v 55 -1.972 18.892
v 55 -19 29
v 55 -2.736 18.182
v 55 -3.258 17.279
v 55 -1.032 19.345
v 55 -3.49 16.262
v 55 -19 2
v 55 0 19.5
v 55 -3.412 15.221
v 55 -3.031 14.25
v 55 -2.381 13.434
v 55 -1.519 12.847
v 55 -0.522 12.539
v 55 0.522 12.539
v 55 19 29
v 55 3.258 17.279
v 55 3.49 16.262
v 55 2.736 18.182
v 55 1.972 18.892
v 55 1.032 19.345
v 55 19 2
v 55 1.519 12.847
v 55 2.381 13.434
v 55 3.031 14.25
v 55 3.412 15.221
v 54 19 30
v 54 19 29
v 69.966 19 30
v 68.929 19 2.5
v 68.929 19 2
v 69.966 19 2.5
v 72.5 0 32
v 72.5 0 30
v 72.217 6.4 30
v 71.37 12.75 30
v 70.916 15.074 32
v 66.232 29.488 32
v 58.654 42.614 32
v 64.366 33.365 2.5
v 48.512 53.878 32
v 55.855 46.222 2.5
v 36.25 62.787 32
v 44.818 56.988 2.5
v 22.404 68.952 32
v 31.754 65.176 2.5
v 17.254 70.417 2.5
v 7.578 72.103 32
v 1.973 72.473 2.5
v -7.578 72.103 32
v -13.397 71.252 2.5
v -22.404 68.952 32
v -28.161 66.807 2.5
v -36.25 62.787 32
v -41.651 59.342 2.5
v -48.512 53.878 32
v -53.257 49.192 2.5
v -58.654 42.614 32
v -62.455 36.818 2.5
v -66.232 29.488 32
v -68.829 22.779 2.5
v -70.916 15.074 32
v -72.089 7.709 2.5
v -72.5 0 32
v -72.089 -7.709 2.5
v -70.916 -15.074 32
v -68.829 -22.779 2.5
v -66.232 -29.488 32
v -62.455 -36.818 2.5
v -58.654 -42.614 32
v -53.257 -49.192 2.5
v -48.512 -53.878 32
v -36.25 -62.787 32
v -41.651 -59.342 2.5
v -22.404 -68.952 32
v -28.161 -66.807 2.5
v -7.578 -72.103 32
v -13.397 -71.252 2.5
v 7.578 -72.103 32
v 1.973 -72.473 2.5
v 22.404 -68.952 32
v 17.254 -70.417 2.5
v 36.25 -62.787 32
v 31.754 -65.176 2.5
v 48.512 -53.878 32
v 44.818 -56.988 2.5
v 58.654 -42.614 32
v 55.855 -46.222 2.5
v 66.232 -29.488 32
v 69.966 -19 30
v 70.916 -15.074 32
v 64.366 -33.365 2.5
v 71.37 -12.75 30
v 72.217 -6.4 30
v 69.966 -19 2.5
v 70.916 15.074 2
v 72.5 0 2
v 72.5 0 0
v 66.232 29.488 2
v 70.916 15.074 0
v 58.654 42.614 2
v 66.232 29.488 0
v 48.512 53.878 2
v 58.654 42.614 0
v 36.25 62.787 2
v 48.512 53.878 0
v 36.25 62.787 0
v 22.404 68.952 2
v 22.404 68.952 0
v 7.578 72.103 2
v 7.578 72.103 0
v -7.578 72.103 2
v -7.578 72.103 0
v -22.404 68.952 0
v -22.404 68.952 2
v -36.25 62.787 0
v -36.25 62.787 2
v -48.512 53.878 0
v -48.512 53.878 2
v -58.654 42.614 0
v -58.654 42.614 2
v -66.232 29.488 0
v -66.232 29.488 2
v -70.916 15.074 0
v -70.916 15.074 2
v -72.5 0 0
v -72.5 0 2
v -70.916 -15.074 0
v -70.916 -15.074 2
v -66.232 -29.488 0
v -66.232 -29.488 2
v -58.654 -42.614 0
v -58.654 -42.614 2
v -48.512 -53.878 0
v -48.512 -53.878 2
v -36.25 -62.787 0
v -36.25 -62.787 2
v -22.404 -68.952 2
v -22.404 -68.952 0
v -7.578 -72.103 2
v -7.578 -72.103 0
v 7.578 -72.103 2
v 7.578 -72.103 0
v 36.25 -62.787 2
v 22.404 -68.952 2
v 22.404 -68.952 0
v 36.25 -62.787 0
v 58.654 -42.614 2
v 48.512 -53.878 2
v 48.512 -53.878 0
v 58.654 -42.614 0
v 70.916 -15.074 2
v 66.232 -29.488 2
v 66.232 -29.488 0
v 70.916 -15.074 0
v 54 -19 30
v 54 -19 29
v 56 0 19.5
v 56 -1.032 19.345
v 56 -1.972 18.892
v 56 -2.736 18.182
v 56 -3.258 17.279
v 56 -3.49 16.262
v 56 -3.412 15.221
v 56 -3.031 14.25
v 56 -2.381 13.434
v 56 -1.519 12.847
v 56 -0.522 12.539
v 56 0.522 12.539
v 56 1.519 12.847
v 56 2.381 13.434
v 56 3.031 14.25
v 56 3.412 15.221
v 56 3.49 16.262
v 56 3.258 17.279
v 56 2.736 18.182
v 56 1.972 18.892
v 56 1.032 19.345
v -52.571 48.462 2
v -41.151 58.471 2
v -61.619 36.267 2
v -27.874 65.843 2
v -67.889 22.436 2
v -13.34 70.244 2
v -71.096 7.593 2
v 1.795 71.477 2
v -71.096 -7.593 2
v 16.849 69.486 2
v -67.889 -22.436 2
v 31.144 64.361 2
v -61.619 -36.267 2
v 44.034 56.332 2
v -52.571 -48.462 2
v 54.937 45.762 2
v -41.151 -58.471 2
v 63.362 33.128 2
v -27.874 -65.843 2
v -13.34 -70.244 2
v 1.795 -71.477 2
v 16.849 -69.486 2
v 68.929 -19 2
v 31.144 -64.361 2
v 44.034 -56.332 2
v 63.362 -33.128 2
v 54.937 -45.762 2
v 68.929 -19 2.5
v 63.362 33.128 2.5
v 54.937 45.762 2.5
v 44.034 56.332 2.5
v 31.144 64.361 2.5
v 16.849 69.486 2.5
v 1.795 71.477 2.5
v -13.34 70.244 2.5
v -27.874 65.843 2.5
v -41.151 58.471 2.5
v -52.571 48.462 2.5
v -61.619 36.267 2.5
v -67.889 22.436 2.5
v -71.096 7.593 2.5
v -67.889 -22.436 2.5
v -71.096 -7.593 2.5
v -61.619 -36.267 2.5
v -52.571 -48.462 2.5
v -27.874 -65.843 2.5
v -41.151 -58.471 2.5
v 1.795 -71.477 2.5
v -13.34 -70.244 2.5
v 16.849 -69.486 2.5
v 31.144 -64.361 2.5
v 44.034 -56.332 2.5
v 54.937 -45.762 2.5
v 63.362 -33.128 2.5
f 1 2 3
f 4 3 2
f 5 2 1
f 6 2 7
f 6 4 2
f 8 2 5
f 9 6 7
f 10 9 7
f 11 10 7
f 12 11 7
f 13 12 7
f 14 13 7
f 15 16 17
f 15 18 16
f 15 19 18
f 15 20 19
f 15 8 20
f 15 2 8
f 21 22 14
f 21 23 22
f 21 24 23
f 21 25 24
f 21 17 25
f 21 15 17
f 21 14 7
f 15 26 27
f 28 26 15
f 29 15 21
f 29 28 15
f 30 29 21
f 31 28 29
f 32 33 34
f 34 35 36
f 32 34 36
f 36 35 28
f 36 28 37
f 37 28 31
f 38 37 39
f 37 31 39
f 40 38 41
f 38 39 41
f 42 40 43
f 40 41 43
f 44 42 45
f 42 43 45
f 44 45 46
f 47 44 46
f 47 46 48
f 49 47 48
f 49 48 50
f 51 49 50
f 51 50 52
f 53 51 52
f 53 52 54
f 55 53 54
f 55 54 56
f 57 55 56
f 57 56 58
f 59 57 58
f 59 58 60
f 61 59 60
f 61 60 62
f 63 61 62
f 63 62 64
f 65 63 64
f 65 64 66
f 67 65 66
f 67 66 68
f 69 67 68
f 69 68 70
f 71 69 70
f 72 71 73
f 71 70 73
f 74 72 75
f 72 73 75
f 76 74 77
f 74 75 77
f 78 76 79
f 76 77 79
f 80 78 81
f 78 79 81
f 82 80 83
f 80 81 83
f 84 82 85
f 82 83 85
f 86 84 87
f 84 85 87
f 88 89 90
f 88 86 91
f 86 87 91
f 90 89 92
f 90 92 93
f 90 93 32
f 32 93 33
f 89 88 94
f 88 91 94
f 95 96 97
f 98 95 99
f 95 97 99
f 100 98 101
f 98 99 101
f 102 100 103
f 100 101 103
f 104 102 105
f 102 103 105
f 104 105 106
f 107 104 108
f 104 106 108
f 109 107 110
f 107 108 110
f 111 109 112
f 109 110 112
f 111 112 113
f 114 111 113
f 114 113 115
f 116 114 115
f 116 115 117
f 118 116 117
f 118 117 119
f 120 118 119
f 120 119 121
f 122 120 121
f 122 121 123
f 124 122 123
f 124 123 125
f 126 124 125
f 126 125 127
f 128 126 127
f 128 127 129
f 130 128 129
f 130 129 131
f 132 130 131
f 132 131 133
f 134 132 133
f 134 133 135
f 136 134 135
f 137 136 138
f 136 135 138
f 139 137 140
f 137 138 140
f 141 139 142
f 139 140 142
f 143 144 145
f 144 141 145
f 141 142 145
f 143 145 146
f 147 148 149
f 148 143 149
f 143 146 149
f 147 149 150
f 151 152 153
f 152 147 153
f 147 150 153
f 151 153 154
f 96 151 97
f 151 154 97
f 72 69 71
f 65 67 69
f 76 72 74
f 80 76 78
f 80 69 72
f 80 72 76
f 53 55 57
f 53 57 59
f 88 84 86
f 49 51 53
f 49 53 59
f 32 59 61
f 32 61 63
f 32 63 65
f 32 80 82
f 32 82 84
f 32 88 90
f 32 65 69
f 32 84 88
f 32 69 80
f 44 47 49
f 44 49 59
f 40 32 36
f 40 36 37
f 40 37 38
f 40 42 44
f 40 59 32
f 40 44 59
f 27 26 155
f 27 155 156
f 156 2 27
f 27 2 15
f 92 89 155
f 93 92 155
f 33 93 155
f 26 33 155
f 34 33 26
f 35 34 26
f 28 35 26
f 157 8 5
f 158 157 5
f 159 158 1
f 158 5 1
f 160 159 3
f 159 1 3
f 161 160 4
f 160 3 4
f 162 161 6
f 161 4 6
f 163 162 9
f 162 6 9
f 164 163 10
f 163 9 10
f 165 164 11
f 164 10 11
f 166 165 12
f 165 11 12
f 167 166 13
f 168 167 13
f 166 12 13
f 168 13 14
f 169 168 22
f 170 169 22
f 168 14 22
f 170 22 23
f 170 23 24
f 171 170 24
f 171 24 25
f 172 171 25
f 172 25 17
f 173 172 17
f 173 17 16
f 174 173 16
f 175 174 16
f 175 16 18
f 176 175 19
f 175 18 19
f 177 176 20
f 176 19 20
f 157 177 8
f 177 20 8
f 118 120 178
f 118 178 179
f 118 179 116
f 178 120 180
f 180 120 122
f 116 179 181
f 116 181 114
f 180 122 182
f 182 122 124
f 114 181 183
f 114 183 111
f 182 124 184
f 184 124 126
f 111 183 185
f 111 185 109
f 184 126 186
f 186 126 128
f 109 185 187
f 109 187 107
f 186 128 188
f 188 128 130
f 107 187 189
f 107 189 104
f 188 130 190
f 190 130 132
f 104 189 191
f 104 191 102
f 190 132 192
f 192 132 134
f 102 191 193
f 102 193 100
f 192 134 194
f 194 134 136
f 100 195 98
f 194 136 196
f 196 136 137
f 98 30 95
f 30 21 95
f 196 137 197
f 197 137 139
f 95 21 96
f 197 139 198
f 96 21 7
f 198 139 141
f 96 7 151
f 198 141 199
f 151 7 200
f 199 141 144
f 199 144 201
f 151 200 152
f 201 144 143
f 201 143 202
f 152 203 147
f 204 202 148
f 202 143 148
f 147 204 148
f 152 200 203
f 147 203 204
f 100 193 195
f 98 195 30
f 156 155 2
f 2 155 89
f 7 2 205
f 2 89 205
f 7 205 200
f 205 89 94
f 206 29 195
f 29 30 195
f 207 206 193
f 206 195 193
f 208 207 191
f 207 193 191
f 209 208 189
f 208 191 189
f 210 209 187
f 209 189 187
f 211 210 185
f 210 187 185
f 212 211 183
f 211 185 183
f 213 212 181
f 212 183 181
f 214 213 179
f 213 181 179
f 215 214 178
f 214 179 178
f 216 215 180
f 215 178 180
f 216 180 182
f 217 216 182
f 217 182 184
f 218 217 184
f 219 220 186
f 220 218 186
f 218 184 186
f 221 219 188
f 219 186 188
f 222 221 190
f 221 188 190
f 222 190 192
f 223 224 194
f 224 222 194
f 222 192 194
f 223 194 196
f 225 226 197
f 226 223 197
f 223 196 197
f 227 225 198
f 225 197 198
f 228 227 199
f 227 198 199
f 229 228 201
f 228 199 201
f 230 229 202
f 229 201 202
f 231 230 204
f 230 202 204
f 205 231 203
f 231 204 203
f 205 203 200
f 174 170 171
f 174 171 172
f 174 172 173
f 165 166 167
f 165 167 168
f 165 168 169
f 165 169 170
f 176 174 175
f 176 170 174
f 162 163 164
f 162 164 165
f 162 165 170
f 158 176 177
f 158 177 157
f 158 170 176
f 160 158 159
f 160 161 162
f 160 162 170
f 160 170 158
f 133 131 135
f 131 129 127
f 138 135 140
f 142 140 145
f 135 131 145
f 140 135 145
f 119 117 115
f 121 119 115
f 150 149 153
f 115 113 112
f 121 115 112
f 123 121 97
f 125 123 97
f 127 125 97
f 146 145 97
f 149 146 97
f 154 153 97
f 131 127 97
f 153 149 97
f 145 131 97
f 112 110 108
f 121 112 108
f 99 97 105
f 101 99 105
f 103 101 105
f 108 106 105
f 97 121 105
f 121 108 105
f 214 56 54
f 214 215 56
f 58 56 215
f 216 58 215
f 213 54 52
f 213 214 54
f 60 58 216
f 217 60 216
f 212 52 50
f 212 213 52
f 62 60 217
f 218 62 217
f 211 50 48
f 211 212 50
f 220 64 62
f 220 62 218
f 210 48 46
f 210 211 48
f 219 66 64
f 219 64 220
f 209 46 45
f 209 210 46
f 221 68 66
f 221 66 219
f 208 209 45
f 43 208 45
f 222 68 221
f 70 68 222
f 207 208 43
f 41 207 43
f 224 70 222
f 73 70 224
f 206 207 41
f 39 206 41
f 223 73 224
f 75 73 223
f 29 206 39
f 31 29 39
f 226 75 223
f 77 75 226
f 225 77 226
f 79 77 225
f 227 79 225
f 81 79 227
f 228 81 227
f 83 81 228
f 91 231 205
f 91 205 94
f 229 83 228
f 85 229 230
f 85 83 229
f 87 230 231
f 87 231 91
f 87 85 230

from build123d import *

# Parameters (mm, degrees)
SKIZZE2_R              = 72.5
BASE_DEPTH             = 32
SKIZZE3_W              = 1
SKIZZE3_H              = 0.5
SKIZZE4_W              = 28
SKIZZE4_H              = 38
FRONT_CAMERA_CUT_DEPTH = 17.5
SKIZZE5_W              = 1
SKIZZE5_H              = 38
FRONT_DETAIL_DEPTH     = 1
SKIZZE6_R              = 3.5
CAMERA_DETAIL_DEPTH    = 1


with BuildPart() as part:
    # Skizze2 → Base (new body)
    with BuildSketch(Plane.XY):
        Circle(SKIZZE2_R)
    extrude(amount=BASE_DEPTH)

    # Skizze3 → Cover Seam (revolve, cut)
    with BuildSketch(Plane(origin=(0, 0, 0), x_dir=(1, 0, 0), z_dir=(0, 1, 0)), mode=Mode.PRIVATE) as cover_seam_sk:
        with Locations((72, -2.25)):
            Rectangle(SKIZZE3_W, SKIZZE3_H)
    revolve(cover_seam_sk.sketch.rotate(Axis((0, 0, 0), (0, 0, 1)), 180), axis=Axis((0, 0, 0), (0, 0, 1)), mode=Mode.SUBTRACT)

    # Skizze4 → Front Camera Cut (cut)
    with BuildSketch(Plane(origin=(72.5, 0, 0), x_dir=(0, 0, -1), z_dir=(1, 0, 0))):
        with Locations((-16, 0)):
            Rectangle(SKIZZE4_W, SKIZZE4_H)
    extrude(amount=-FRONT_CAMERA_CUT_DEPTH, mode=Mode.SUBTRACT)

    # Skizze5 → Front Detail (cut)
    with BuildSketch(Plane(origin=(55, 0, 0), x_dir=(0, 0, -1), z_dir=(1, 0, 0))):
        with Locations((-29.5, 0)):
            Rectangle(SKIZZE5_W, SKIZZE5_H)
    extrude(amount=-FRONT_DETAIL_DEPTH, mode=Mode.SUBTRACT)

    # Skizze6 → Camera Detail (add)
    with BuildSketch(Plane(origin=(55, 0, 0), x_dir=(0, 0, -1), z_dir=(1, 0, 0))):
        with Locations(Location((-16, 0, 0), (0, 0, 180))):
            Circle(SKIZZE6_R)
    extrude(amount=CAMERA_DETAIL_DEPTH)


solid = part.part
